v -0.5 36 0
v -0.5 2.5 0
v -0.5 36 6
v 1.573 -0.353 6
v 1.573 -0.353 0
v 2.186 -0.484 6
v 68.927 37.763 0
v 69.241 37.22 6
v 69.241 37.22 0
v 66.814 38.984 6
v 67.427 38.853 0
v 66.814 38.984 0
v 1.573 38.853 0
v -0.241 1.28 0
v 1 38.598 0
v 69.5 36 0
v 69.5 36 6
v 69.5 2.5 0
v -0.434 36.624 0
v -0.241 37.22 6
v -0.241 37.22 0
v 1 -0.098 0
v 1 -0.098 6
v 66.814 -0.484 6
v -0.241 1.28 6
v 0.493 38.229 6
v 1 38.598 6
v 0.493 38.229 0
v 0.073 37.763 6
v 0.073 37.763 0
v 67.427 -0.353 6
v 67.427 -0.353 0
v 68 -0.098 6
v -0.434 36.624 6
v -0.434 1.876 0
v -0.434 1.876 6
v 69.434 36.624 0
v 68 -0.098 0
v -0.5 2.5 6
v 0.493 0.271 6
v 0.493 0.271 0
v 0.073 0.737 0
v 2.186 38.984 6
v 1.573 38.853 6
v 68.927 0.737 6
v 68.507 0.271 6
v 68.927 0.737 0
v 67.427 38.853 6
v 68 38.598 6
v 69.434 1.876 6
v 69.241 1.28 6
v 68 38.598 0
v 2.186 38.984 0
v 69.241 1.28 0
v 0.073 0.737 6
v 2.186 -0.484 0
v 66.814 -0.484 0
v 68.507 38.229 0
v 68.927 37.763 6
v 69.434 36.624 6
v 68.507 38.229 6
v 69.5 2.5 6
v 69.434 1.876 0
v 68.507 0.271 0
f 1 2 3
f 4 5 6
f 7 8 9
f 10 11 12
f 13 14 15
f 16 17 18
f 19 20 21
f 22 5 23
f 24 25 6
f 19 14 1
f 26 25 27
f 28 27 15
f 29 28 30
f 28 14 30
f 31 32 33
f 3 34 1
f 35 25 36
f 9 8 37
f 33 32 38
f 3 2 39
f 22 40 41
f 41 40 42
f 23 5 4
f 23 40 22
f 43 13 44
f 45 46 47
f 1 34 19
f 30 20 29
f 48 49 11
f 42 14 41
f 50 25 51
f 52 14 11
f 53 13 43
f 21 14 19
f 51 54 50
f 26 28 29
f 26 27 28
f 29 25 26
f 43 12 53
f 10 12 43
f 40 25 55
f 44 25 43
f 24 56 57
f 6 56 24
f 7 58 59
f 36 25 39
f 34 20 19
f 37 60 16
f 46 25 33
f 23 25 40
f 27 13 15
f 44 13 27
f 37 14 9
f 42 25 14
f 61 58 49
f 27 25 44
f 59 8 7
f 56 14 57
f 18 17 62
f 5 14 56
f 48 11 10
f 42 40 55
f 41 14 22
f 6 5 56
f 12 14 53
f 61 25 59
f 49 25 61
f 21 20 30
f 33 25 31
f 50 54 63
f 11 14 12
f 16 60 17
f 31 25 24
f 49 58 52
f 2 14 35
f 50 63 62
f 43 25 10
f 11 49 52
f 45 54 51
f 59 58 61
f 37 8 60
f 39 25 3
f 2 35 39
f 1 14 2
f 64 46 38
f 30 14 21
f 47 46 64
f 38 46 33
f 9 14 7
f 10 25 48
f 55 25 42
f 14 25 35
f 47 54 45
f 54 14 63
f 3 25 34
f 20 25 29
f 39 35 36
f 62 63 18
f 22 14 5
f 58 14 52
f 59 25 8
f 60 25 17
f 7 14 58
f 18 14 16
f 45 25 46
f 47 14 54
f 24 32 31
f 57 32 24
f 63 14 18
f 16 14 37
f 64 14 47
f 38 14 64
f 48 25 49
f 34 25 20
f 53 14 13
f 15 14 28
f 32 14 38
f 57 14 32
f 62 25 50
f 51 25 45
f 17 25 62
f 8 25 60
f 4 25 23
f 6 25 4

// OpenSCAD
x = 64;
y = 33.5;
z = 3;
xa = 2.5;
ya = 2.5;
$fn=30;
minkowski() {
    cube([x, y, z]);
    translate([xa, ya, 0]) cylinder(z, 3, 3);
}

//base
//box that goes up, tapering from the outside 50.4 to 33.2 at the top
//box wall width is 2.5
//lots of various shapes and things
//total height is 67.3
